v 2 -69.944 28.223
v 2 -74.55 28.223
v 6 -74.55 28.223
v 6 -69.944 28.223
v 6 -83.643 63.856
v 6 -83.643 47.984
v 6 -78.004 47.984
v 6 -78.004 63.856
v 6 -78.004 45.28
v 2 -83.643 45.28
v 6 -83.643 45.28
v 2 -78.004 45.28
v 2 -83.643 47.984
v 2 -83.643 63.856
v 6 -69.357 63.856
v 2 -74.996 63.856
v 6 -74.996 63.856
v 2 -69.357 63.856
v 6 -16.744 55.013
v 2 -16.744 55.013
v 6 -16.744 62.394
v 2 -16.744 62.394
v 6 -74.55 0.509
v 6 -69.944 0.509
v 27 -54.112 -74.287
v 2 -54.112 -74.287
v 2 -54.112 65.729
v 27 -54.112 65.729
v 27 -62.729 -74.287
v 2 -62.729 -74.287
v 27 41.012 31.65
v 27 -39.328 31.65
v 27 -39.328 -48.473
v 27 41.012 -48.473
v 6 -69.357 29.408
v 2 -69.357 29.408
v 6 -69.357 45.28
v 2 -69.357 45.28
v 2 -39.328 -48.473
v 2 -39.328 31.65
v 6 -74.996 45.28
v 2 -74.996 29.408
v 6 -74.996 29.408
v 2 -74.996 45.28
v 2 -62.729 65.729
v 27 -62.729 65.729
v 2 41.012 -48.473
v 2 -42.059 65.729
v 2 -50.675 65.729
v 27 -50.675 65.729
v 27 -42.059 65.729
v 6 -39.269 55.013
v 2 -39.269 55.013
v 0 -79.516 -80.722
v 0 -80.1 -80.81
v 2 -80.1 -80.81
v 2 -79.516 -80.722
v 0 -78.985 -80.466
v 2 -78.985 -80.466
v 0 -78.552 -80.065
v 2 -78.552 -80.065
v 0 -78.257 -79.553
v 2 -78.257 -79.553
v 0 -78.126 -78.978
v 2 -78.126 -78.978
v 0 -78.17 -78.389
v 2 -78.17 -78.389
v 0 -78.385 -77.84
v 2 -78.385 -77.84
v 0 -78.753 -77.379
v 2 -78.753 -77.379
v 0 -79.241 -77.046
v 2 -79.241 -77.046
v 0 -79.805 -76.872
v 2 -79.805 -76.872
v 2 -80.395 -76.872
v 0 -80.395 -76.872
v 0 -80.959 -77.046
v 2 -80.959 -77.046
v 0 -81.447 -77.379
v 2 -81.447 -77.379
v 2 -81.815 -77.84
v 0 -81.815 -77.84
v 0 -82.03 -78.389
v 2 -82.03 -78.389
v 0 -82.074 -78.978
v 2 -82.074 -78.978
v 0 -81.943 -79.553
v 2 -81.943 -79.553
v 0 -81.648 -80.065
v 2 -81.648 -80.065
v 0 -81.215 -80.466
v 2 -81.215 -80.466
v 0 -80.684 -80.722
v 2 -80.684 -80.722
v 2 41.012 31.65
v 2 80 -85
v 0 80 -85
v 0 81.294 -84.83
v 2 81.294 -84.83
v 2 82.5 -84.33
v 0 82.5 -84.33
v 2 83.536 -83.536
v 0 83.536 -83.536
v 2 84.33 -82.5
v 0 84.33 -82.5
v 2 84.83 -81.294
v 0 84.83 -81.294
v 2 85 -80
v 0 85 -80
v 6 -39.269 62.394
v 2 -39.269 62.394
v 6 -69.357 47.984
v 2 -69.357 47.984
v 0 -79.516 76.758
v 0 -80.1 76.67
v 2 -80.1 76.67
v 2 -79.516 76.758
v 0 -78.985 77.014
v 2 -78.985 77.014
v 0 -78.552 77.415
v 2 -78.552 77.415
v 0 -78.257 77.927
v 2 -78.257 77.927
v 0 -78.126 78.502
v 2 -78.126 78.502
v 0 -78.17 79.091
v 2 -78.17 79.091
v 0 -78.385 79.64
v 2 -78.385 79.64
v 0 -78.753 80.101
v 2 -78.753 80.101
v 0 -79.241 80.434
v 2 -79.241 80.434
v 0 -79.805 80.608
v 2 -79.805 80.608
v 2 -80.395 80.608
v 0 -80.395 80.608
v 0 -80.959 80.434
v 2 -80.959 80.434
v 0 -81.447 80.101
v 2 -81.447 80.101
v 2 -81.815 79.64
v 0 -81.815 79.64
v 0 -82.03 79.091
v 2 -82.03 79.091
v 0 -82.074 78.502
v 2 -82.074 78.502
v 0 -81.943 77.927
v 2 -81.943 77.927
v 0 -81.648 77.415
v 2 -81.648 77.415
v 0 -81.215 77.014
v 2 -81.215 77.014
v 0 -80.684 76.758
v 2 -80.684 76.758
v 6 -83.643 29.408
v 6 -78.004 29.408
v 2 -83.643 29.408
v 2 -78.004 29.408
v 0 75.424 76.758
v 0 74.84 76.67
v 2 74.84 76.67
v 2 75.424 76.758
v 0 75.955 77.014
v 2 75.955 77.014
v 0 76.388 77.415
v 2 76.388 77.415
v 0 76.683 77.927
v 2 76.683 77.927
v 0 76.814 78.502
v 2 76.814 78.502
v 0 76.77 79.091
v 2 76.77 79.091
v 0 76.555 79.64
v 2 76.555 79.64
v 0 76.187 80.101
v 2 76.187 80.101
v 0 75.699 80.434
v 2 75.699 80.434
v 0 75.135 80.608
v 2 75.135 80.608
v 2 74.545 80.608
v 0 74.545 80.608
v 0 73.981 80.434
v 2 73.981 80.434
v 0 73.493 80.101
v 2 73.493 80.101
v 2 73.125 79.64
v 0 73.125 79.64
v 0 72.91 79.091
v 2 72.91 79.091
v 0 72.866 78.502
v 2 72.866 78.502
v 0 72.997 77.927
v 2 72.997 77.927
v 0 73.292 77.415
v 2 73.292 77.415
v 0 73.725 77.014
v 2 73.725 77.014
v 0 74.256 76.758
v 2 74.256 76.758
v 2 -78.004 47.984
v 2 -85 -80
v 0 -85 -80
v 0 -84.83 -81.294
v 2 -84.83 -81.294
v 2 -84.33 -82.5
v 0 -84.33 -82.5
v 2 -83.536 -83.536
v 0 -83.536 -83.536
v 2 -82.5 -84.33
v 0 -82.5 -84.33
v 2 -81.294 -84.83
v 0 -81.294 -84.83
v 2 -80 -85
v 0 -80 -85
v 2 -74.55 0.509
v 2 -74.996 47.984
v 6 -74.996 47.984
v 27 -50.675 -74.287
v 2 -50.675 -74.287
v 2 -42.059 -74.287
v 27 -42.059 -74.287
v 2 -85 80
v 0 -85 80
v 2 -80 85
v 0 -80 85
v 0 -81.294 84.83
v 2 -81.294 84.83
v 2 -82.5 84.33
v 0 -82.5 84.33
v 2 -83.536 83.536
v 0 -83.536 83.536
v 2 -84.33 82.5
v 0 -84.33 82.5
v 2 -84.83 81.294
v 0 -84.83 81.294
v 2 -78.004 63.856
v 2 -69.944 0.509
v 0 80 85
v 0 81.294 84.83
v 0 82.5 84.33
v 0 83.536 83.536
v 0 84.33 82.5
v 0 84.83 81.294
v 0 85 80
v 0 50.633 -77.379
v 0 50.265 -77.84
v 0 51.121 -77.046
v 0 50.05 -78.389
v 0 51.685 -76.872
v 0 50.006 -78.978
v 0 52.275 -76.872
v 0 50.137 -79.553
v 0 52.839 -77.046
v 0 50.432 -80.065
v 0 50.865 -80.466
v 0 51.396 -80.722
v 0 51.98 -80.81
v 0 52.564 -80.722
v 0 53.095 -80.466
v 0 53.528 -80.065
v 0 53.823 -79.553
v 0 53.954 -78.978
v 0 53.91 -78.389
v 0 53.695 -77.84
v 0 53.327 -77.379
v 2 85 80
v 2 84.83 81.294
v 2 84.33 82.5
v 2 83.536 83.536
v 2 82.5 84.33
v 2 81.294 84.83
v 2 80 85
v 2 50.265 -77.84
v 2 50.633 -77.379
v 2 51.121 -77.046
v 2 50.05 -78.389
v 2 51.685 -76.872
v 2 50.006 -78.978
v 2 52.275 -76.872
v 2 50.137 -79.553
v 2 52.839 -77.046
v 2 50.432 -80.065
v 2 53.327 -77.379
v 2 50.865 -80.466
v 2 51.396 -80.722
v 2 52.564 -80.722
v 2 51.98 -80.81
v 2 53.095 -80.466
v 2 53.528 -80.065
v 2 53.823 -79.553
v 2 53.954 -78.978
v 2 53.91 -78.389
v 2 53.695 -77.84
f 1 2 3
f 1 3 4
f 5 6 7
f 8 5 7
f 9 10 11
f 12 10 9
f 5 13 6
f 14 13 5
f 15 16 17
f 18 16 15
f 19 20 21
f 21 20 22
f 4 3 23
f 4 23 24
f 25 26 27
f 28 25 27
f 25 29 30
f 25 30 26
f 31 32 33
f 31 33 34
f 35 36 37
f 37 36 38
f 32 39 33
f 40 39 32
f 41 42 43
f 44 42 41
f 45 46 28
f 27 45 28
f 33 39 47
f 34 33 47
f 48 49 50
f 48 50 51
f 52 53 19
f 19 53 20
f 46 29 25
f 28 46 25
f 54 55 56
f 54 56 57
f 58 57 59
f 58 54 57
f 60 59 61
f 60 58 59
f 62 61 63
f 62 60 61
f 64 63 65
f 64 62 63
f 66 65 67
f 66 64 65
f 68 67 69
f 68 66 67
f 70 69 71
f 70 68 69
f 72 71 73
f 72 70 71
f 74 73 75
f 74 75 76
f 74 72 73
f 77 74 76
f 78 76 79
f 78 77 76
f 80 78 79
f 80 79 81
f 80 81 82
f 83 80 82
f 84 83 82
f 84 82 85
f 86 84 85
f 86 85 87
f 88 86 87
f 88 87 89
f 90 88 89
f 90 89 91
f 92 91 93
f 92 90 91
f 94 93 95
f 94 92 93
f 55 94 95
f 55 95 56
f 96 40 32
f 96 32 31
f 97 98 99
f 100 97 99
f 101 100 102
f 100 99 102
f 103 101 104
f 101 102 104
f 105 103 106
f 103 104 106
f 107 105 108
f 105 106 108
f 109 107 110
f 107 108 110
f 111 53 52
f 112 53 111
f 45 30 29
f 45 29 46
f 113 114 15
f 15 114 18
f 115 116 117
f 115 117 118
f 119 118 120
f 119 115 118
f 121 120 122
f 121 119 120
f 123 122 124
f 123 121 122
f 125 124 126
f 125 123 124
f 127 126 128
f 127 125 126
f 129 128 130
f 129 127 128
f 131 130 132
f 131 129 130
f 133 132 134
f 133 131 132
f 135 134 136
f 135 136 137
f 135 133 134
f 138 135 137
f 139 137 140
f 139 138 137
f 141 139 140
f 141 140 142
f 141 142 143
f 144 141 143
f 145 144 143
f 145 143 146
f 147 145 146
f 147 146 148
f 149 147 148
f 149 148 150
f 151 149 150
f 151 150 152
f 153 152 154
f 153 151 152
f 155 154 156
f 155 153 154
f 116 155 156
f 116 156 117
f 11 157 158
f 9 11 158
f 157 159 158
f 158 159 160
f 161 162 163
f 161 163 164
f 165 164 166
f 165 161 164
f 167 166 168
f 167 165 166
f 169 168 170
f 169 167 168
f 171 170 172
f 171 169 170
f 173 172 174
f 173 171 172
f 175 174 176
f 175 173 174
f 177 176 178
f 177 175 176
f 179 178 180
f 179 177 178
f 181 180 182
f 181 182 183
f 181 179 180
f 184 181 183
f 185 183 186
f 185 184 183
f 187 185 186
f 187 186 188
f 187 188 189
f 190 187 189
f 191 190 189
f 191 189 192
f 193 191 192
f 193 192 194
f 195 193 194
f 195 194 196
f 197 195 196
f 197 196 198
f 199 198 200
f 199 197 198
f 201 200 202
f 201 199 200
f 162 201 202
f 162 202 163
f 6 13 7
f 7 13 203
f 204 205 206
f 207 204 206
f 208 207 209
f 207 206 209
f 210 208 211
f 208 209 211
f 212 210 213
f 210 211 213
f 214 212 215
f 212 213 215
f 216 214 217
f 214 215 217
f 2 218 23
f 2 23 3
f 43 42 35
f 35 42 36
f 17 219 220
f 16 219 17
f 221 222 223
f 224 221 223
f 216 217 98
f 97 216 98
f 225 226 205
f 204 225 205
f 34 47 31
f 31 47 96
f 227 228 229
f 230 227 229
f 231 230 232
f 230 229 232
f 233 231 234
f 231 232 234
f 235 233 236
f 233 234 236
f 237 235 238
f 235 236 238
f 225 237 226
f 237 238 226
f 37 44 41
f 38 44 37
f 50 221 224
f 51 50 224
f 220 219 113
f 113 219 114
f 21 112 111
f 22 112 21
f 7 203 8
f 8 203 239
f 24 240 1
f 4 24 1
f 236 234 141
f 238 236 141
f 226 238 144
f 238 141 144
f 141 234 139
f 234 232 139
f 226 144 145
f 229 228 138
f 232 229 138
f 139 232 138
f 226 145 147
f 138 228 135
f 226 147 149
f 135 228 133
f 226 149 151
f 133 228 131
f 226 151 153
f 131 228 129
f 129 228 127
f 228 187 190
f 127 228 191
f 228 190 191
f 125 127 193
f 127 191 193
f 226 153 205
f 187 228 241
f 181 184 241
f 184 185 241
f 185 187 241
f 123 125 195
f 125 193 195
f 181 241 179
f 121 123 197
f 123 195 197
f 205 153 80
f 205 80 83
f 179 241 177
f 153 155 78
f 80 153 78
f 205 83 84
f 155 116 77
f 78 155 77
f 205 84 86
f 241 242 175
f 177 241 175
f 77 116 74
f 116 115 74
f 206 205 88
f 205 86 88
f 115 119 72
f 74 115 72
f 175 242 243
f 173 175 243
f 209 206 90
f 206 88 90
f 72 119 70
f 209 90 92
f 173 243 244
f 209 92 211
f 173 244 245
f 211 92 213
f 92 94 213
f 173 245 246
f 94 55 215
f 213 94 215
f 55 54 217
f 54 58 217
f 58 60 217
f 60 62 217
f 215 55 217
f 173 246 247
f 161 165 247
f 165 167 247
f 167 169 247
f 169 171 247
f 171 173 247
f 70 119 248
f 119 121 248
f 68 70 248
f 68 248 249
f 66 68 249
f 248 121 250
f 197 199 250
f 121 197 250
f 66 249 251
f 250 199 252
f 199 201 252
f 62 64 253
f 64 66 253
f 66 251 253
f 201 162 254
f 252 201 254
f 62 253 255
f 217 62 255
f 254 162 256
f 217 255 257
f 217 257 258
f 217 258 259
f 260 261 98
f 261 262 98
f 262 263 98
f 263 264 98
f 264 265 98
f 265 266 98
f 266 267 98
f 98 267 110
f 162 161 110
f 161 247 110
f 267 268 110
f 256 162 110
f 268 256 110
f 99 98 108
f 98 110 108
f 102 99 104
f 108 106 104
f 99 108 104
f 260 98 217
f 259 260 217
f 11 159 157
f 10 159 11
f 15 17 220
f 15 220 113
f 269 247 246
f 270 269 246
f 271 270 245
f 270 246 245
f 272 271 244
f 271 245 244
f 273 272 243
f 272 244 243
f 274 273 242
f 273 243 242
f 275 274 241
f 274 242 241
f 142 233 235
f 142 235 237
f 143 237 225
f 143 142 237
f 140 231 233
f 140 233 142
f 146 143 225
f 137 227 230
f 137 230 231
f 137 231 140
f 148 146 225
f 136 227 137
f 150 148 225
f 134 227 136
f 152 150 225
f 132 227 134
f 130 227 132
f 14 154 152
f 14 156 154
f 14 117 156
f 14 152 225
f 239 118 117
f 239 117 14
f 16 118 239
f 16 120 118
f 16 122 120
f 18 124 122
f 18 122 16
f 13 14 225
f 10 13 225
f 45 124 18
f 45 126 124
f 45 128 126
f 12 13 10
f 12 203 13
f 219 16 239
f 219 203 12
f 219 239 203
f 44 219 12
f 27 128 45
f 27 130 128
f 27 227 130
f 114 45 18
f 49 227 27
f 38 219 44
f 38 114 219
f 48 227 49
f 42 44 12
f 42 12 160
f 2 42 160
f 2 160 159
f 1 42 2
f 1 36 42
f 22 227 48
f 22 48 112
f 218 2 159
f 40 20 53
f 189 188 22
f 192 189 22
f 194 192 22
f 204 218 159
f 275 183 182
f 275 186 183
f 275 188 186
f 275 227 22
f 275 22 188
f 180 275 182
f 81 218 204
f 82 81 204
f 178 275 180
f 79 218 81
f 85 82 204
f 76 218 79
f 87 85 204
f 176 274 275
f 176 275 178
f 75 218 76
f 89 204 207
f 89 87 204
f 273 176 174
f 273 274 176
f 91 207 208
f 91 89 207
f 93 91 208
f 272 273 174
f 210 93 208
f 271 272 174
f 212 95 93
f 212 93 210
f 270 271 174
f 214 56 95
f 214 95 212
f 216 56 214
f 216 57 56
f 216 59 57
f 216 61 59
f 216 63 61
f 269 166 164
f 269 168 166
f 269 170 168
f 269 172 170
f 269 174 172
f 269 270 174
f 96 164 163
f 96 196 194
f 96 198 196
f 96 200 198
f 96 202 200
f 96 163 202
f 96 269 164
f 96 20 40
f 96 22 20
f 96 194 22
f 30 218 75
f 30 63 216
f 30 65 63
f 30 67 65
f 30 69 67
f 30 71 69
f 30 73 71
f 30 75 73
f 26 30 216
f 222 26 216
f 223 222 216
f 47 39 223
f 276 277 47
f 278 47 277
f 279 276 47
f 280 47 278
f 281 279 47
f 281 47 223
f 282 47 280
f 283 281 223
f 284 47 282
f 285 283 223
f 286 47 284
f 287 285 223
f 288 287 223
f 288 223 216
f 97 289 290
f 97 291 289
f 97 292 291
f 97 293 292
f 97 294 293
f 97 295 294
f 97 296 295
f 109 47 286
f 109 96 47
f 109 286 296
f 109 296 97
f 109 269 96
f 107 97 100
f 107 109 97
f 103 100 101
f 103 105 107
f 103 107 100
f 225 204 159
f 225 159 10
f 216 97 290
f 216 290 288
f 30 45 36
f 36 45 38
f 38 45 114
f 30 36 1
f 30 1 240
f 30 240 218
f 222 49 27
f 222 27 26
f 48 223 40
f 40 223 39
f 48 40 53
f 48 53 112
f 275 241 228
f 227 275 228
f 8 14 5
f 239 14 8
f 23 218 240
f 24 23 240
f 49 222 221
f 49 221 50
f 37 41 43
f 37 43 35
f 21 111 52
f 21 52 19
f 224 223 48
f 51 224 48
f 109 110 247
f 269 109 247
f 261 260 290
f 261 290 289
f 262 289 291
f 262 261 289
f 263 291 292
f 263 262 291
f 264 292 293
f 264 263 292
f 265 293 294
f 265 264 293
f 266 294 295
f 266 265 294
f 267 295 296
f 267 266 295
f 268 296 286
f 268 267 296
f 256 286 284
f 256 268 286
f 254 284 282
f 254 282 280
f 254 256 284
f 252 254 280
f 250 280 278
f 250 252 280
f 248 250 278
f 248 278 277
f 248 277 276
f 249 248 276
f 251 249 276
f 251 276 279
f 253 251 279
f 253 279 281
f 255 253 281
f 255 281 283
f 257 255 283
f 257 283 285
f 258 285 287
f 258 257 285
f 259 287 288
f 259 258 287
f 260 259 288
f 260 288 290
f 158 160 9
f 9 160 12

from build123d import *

# Parameters (mm, degrees)
F0_R     = 1.98
F1_DEPTH = 2
F3_ANGLE = -90
F4_W     = 5.638488
F4_H     = 15.871309
F4_W_2   = 5.638487
F5_DEPTH = 4
F4_W_3   = 4.60542
F4_H_2   = 27.714742
F6_DEPTH = 4
F4_W_4   = 22.524819
F4_H_3   = 7.381014
F7_DEPTH = 4
F4_W_5   = 80.340352
F4_H_4   = 80.123208
F8_DEPTH = 25
F4_W_6   = 8.616418
F4_H_5   = 140.016765
F4_W_7   = 8.616417
F9_DEPTH = 25


with BuildPart() as f1:
    # F0 (on Right) → F1 (new body)
    with BuildSketch(Plane.YZ):
        with BuildLine():
            Line((-80, -85), (80, -85))
            ThreePointArc((80, -85), (83.535534, -83.535534), (85, -80))
            Line((85, -80), (85, 80))
            ThreePointArc((85, 80), (83.535534, 83.535534), (80, 85))
            Line((80, 85), (-80, 85))
            ThreePointArc((-80, 85), (-83.535534, 83.535534), (-85, 80))
            Line((-85, 80), (-85, -80))
            ThreePointArc((-85, -80), (-83.535534, -83.535534), (-80, -85))
        make_face()
        with Locations((-78.65, -80.1)):
            Circle(F0_R, mode=Mode.SUBTRACT)
        with Locations((78.83, -80.1)):
            Circle(F0_R, mode=Mode.SUBTRACT)
        with Locations((-78.65, 74.84)):
            Circle(F0_R, mode=Mode.SUBTRACT)
        with Locations((78.83, 51.98)):
            Circle(F0_R, mode=Mode.SUBTRACT)
    extrude(amount=F1_DEPTH)


with BuildPart() as f1_1:
    # F3: moved
    add(f1.part.rotate(Axis((1.078181, 0, 0), (1, 0, 0)), F3_ANGLE))

    # F4 (on face) → F5 (join)
    with BuildSketch(Plane.YZ.offset(2)):
        with Locations((-72.176602, 55.920038)):
            Rectangle(F4_W, F4_H)
        with Locations((-80.823529, 55.920038)):
            Rectangle(F4_W_2, F4_H)
        with Locations((-80.823529, 37.344094)):
            Rectangle(F4_W_2, F4_H)
        with Locations((-72.176602, 37.344094)):
            Rectangle(F4_W, F4_H)
    extrude(amount=F5_DEPTH)

    # F4 (on face) → F6 (join)
    with BuildSketch(Plane.YZ.offset(2)):
        with Locations((-72.246823, 14.365959)):
            Rectangle(F4_W_3, F4_H_2)
    extrude(amount=F6_DEPTH)

    # F4 (on face) → F7 (join)
    with BuildSketch(Plane.YZ.offset(2)):
        with Locations((-28.006542, 58.70362)):
            Rectangle(F4_W_4, F4_H_3)
    extrude(amount=F7_DEPTH)

    # F4 (on face) → F8 (join)
    with BuildSketch(Plane.YZ.offset(2)):
        with Locations((0.842279, -8.411627)):
            Rectangle(F4_W_5, F4_H_4)
    extrude(amount=F8_DEPTH)

    # F4 (on face) → F9 (join)
    with BuildSketch(Plane.YZ.offset(2)):
        with Locations((-58.420569, -4.278883)):
            Rectangle(F4_W_6, F4_H_5)
        with Locations((-46.367261, -4.278883)):
            Rectangle(F4_W_7, F4_H_5)
    extrude(amount=F9_DEPTH)


solid = f1_1.part
